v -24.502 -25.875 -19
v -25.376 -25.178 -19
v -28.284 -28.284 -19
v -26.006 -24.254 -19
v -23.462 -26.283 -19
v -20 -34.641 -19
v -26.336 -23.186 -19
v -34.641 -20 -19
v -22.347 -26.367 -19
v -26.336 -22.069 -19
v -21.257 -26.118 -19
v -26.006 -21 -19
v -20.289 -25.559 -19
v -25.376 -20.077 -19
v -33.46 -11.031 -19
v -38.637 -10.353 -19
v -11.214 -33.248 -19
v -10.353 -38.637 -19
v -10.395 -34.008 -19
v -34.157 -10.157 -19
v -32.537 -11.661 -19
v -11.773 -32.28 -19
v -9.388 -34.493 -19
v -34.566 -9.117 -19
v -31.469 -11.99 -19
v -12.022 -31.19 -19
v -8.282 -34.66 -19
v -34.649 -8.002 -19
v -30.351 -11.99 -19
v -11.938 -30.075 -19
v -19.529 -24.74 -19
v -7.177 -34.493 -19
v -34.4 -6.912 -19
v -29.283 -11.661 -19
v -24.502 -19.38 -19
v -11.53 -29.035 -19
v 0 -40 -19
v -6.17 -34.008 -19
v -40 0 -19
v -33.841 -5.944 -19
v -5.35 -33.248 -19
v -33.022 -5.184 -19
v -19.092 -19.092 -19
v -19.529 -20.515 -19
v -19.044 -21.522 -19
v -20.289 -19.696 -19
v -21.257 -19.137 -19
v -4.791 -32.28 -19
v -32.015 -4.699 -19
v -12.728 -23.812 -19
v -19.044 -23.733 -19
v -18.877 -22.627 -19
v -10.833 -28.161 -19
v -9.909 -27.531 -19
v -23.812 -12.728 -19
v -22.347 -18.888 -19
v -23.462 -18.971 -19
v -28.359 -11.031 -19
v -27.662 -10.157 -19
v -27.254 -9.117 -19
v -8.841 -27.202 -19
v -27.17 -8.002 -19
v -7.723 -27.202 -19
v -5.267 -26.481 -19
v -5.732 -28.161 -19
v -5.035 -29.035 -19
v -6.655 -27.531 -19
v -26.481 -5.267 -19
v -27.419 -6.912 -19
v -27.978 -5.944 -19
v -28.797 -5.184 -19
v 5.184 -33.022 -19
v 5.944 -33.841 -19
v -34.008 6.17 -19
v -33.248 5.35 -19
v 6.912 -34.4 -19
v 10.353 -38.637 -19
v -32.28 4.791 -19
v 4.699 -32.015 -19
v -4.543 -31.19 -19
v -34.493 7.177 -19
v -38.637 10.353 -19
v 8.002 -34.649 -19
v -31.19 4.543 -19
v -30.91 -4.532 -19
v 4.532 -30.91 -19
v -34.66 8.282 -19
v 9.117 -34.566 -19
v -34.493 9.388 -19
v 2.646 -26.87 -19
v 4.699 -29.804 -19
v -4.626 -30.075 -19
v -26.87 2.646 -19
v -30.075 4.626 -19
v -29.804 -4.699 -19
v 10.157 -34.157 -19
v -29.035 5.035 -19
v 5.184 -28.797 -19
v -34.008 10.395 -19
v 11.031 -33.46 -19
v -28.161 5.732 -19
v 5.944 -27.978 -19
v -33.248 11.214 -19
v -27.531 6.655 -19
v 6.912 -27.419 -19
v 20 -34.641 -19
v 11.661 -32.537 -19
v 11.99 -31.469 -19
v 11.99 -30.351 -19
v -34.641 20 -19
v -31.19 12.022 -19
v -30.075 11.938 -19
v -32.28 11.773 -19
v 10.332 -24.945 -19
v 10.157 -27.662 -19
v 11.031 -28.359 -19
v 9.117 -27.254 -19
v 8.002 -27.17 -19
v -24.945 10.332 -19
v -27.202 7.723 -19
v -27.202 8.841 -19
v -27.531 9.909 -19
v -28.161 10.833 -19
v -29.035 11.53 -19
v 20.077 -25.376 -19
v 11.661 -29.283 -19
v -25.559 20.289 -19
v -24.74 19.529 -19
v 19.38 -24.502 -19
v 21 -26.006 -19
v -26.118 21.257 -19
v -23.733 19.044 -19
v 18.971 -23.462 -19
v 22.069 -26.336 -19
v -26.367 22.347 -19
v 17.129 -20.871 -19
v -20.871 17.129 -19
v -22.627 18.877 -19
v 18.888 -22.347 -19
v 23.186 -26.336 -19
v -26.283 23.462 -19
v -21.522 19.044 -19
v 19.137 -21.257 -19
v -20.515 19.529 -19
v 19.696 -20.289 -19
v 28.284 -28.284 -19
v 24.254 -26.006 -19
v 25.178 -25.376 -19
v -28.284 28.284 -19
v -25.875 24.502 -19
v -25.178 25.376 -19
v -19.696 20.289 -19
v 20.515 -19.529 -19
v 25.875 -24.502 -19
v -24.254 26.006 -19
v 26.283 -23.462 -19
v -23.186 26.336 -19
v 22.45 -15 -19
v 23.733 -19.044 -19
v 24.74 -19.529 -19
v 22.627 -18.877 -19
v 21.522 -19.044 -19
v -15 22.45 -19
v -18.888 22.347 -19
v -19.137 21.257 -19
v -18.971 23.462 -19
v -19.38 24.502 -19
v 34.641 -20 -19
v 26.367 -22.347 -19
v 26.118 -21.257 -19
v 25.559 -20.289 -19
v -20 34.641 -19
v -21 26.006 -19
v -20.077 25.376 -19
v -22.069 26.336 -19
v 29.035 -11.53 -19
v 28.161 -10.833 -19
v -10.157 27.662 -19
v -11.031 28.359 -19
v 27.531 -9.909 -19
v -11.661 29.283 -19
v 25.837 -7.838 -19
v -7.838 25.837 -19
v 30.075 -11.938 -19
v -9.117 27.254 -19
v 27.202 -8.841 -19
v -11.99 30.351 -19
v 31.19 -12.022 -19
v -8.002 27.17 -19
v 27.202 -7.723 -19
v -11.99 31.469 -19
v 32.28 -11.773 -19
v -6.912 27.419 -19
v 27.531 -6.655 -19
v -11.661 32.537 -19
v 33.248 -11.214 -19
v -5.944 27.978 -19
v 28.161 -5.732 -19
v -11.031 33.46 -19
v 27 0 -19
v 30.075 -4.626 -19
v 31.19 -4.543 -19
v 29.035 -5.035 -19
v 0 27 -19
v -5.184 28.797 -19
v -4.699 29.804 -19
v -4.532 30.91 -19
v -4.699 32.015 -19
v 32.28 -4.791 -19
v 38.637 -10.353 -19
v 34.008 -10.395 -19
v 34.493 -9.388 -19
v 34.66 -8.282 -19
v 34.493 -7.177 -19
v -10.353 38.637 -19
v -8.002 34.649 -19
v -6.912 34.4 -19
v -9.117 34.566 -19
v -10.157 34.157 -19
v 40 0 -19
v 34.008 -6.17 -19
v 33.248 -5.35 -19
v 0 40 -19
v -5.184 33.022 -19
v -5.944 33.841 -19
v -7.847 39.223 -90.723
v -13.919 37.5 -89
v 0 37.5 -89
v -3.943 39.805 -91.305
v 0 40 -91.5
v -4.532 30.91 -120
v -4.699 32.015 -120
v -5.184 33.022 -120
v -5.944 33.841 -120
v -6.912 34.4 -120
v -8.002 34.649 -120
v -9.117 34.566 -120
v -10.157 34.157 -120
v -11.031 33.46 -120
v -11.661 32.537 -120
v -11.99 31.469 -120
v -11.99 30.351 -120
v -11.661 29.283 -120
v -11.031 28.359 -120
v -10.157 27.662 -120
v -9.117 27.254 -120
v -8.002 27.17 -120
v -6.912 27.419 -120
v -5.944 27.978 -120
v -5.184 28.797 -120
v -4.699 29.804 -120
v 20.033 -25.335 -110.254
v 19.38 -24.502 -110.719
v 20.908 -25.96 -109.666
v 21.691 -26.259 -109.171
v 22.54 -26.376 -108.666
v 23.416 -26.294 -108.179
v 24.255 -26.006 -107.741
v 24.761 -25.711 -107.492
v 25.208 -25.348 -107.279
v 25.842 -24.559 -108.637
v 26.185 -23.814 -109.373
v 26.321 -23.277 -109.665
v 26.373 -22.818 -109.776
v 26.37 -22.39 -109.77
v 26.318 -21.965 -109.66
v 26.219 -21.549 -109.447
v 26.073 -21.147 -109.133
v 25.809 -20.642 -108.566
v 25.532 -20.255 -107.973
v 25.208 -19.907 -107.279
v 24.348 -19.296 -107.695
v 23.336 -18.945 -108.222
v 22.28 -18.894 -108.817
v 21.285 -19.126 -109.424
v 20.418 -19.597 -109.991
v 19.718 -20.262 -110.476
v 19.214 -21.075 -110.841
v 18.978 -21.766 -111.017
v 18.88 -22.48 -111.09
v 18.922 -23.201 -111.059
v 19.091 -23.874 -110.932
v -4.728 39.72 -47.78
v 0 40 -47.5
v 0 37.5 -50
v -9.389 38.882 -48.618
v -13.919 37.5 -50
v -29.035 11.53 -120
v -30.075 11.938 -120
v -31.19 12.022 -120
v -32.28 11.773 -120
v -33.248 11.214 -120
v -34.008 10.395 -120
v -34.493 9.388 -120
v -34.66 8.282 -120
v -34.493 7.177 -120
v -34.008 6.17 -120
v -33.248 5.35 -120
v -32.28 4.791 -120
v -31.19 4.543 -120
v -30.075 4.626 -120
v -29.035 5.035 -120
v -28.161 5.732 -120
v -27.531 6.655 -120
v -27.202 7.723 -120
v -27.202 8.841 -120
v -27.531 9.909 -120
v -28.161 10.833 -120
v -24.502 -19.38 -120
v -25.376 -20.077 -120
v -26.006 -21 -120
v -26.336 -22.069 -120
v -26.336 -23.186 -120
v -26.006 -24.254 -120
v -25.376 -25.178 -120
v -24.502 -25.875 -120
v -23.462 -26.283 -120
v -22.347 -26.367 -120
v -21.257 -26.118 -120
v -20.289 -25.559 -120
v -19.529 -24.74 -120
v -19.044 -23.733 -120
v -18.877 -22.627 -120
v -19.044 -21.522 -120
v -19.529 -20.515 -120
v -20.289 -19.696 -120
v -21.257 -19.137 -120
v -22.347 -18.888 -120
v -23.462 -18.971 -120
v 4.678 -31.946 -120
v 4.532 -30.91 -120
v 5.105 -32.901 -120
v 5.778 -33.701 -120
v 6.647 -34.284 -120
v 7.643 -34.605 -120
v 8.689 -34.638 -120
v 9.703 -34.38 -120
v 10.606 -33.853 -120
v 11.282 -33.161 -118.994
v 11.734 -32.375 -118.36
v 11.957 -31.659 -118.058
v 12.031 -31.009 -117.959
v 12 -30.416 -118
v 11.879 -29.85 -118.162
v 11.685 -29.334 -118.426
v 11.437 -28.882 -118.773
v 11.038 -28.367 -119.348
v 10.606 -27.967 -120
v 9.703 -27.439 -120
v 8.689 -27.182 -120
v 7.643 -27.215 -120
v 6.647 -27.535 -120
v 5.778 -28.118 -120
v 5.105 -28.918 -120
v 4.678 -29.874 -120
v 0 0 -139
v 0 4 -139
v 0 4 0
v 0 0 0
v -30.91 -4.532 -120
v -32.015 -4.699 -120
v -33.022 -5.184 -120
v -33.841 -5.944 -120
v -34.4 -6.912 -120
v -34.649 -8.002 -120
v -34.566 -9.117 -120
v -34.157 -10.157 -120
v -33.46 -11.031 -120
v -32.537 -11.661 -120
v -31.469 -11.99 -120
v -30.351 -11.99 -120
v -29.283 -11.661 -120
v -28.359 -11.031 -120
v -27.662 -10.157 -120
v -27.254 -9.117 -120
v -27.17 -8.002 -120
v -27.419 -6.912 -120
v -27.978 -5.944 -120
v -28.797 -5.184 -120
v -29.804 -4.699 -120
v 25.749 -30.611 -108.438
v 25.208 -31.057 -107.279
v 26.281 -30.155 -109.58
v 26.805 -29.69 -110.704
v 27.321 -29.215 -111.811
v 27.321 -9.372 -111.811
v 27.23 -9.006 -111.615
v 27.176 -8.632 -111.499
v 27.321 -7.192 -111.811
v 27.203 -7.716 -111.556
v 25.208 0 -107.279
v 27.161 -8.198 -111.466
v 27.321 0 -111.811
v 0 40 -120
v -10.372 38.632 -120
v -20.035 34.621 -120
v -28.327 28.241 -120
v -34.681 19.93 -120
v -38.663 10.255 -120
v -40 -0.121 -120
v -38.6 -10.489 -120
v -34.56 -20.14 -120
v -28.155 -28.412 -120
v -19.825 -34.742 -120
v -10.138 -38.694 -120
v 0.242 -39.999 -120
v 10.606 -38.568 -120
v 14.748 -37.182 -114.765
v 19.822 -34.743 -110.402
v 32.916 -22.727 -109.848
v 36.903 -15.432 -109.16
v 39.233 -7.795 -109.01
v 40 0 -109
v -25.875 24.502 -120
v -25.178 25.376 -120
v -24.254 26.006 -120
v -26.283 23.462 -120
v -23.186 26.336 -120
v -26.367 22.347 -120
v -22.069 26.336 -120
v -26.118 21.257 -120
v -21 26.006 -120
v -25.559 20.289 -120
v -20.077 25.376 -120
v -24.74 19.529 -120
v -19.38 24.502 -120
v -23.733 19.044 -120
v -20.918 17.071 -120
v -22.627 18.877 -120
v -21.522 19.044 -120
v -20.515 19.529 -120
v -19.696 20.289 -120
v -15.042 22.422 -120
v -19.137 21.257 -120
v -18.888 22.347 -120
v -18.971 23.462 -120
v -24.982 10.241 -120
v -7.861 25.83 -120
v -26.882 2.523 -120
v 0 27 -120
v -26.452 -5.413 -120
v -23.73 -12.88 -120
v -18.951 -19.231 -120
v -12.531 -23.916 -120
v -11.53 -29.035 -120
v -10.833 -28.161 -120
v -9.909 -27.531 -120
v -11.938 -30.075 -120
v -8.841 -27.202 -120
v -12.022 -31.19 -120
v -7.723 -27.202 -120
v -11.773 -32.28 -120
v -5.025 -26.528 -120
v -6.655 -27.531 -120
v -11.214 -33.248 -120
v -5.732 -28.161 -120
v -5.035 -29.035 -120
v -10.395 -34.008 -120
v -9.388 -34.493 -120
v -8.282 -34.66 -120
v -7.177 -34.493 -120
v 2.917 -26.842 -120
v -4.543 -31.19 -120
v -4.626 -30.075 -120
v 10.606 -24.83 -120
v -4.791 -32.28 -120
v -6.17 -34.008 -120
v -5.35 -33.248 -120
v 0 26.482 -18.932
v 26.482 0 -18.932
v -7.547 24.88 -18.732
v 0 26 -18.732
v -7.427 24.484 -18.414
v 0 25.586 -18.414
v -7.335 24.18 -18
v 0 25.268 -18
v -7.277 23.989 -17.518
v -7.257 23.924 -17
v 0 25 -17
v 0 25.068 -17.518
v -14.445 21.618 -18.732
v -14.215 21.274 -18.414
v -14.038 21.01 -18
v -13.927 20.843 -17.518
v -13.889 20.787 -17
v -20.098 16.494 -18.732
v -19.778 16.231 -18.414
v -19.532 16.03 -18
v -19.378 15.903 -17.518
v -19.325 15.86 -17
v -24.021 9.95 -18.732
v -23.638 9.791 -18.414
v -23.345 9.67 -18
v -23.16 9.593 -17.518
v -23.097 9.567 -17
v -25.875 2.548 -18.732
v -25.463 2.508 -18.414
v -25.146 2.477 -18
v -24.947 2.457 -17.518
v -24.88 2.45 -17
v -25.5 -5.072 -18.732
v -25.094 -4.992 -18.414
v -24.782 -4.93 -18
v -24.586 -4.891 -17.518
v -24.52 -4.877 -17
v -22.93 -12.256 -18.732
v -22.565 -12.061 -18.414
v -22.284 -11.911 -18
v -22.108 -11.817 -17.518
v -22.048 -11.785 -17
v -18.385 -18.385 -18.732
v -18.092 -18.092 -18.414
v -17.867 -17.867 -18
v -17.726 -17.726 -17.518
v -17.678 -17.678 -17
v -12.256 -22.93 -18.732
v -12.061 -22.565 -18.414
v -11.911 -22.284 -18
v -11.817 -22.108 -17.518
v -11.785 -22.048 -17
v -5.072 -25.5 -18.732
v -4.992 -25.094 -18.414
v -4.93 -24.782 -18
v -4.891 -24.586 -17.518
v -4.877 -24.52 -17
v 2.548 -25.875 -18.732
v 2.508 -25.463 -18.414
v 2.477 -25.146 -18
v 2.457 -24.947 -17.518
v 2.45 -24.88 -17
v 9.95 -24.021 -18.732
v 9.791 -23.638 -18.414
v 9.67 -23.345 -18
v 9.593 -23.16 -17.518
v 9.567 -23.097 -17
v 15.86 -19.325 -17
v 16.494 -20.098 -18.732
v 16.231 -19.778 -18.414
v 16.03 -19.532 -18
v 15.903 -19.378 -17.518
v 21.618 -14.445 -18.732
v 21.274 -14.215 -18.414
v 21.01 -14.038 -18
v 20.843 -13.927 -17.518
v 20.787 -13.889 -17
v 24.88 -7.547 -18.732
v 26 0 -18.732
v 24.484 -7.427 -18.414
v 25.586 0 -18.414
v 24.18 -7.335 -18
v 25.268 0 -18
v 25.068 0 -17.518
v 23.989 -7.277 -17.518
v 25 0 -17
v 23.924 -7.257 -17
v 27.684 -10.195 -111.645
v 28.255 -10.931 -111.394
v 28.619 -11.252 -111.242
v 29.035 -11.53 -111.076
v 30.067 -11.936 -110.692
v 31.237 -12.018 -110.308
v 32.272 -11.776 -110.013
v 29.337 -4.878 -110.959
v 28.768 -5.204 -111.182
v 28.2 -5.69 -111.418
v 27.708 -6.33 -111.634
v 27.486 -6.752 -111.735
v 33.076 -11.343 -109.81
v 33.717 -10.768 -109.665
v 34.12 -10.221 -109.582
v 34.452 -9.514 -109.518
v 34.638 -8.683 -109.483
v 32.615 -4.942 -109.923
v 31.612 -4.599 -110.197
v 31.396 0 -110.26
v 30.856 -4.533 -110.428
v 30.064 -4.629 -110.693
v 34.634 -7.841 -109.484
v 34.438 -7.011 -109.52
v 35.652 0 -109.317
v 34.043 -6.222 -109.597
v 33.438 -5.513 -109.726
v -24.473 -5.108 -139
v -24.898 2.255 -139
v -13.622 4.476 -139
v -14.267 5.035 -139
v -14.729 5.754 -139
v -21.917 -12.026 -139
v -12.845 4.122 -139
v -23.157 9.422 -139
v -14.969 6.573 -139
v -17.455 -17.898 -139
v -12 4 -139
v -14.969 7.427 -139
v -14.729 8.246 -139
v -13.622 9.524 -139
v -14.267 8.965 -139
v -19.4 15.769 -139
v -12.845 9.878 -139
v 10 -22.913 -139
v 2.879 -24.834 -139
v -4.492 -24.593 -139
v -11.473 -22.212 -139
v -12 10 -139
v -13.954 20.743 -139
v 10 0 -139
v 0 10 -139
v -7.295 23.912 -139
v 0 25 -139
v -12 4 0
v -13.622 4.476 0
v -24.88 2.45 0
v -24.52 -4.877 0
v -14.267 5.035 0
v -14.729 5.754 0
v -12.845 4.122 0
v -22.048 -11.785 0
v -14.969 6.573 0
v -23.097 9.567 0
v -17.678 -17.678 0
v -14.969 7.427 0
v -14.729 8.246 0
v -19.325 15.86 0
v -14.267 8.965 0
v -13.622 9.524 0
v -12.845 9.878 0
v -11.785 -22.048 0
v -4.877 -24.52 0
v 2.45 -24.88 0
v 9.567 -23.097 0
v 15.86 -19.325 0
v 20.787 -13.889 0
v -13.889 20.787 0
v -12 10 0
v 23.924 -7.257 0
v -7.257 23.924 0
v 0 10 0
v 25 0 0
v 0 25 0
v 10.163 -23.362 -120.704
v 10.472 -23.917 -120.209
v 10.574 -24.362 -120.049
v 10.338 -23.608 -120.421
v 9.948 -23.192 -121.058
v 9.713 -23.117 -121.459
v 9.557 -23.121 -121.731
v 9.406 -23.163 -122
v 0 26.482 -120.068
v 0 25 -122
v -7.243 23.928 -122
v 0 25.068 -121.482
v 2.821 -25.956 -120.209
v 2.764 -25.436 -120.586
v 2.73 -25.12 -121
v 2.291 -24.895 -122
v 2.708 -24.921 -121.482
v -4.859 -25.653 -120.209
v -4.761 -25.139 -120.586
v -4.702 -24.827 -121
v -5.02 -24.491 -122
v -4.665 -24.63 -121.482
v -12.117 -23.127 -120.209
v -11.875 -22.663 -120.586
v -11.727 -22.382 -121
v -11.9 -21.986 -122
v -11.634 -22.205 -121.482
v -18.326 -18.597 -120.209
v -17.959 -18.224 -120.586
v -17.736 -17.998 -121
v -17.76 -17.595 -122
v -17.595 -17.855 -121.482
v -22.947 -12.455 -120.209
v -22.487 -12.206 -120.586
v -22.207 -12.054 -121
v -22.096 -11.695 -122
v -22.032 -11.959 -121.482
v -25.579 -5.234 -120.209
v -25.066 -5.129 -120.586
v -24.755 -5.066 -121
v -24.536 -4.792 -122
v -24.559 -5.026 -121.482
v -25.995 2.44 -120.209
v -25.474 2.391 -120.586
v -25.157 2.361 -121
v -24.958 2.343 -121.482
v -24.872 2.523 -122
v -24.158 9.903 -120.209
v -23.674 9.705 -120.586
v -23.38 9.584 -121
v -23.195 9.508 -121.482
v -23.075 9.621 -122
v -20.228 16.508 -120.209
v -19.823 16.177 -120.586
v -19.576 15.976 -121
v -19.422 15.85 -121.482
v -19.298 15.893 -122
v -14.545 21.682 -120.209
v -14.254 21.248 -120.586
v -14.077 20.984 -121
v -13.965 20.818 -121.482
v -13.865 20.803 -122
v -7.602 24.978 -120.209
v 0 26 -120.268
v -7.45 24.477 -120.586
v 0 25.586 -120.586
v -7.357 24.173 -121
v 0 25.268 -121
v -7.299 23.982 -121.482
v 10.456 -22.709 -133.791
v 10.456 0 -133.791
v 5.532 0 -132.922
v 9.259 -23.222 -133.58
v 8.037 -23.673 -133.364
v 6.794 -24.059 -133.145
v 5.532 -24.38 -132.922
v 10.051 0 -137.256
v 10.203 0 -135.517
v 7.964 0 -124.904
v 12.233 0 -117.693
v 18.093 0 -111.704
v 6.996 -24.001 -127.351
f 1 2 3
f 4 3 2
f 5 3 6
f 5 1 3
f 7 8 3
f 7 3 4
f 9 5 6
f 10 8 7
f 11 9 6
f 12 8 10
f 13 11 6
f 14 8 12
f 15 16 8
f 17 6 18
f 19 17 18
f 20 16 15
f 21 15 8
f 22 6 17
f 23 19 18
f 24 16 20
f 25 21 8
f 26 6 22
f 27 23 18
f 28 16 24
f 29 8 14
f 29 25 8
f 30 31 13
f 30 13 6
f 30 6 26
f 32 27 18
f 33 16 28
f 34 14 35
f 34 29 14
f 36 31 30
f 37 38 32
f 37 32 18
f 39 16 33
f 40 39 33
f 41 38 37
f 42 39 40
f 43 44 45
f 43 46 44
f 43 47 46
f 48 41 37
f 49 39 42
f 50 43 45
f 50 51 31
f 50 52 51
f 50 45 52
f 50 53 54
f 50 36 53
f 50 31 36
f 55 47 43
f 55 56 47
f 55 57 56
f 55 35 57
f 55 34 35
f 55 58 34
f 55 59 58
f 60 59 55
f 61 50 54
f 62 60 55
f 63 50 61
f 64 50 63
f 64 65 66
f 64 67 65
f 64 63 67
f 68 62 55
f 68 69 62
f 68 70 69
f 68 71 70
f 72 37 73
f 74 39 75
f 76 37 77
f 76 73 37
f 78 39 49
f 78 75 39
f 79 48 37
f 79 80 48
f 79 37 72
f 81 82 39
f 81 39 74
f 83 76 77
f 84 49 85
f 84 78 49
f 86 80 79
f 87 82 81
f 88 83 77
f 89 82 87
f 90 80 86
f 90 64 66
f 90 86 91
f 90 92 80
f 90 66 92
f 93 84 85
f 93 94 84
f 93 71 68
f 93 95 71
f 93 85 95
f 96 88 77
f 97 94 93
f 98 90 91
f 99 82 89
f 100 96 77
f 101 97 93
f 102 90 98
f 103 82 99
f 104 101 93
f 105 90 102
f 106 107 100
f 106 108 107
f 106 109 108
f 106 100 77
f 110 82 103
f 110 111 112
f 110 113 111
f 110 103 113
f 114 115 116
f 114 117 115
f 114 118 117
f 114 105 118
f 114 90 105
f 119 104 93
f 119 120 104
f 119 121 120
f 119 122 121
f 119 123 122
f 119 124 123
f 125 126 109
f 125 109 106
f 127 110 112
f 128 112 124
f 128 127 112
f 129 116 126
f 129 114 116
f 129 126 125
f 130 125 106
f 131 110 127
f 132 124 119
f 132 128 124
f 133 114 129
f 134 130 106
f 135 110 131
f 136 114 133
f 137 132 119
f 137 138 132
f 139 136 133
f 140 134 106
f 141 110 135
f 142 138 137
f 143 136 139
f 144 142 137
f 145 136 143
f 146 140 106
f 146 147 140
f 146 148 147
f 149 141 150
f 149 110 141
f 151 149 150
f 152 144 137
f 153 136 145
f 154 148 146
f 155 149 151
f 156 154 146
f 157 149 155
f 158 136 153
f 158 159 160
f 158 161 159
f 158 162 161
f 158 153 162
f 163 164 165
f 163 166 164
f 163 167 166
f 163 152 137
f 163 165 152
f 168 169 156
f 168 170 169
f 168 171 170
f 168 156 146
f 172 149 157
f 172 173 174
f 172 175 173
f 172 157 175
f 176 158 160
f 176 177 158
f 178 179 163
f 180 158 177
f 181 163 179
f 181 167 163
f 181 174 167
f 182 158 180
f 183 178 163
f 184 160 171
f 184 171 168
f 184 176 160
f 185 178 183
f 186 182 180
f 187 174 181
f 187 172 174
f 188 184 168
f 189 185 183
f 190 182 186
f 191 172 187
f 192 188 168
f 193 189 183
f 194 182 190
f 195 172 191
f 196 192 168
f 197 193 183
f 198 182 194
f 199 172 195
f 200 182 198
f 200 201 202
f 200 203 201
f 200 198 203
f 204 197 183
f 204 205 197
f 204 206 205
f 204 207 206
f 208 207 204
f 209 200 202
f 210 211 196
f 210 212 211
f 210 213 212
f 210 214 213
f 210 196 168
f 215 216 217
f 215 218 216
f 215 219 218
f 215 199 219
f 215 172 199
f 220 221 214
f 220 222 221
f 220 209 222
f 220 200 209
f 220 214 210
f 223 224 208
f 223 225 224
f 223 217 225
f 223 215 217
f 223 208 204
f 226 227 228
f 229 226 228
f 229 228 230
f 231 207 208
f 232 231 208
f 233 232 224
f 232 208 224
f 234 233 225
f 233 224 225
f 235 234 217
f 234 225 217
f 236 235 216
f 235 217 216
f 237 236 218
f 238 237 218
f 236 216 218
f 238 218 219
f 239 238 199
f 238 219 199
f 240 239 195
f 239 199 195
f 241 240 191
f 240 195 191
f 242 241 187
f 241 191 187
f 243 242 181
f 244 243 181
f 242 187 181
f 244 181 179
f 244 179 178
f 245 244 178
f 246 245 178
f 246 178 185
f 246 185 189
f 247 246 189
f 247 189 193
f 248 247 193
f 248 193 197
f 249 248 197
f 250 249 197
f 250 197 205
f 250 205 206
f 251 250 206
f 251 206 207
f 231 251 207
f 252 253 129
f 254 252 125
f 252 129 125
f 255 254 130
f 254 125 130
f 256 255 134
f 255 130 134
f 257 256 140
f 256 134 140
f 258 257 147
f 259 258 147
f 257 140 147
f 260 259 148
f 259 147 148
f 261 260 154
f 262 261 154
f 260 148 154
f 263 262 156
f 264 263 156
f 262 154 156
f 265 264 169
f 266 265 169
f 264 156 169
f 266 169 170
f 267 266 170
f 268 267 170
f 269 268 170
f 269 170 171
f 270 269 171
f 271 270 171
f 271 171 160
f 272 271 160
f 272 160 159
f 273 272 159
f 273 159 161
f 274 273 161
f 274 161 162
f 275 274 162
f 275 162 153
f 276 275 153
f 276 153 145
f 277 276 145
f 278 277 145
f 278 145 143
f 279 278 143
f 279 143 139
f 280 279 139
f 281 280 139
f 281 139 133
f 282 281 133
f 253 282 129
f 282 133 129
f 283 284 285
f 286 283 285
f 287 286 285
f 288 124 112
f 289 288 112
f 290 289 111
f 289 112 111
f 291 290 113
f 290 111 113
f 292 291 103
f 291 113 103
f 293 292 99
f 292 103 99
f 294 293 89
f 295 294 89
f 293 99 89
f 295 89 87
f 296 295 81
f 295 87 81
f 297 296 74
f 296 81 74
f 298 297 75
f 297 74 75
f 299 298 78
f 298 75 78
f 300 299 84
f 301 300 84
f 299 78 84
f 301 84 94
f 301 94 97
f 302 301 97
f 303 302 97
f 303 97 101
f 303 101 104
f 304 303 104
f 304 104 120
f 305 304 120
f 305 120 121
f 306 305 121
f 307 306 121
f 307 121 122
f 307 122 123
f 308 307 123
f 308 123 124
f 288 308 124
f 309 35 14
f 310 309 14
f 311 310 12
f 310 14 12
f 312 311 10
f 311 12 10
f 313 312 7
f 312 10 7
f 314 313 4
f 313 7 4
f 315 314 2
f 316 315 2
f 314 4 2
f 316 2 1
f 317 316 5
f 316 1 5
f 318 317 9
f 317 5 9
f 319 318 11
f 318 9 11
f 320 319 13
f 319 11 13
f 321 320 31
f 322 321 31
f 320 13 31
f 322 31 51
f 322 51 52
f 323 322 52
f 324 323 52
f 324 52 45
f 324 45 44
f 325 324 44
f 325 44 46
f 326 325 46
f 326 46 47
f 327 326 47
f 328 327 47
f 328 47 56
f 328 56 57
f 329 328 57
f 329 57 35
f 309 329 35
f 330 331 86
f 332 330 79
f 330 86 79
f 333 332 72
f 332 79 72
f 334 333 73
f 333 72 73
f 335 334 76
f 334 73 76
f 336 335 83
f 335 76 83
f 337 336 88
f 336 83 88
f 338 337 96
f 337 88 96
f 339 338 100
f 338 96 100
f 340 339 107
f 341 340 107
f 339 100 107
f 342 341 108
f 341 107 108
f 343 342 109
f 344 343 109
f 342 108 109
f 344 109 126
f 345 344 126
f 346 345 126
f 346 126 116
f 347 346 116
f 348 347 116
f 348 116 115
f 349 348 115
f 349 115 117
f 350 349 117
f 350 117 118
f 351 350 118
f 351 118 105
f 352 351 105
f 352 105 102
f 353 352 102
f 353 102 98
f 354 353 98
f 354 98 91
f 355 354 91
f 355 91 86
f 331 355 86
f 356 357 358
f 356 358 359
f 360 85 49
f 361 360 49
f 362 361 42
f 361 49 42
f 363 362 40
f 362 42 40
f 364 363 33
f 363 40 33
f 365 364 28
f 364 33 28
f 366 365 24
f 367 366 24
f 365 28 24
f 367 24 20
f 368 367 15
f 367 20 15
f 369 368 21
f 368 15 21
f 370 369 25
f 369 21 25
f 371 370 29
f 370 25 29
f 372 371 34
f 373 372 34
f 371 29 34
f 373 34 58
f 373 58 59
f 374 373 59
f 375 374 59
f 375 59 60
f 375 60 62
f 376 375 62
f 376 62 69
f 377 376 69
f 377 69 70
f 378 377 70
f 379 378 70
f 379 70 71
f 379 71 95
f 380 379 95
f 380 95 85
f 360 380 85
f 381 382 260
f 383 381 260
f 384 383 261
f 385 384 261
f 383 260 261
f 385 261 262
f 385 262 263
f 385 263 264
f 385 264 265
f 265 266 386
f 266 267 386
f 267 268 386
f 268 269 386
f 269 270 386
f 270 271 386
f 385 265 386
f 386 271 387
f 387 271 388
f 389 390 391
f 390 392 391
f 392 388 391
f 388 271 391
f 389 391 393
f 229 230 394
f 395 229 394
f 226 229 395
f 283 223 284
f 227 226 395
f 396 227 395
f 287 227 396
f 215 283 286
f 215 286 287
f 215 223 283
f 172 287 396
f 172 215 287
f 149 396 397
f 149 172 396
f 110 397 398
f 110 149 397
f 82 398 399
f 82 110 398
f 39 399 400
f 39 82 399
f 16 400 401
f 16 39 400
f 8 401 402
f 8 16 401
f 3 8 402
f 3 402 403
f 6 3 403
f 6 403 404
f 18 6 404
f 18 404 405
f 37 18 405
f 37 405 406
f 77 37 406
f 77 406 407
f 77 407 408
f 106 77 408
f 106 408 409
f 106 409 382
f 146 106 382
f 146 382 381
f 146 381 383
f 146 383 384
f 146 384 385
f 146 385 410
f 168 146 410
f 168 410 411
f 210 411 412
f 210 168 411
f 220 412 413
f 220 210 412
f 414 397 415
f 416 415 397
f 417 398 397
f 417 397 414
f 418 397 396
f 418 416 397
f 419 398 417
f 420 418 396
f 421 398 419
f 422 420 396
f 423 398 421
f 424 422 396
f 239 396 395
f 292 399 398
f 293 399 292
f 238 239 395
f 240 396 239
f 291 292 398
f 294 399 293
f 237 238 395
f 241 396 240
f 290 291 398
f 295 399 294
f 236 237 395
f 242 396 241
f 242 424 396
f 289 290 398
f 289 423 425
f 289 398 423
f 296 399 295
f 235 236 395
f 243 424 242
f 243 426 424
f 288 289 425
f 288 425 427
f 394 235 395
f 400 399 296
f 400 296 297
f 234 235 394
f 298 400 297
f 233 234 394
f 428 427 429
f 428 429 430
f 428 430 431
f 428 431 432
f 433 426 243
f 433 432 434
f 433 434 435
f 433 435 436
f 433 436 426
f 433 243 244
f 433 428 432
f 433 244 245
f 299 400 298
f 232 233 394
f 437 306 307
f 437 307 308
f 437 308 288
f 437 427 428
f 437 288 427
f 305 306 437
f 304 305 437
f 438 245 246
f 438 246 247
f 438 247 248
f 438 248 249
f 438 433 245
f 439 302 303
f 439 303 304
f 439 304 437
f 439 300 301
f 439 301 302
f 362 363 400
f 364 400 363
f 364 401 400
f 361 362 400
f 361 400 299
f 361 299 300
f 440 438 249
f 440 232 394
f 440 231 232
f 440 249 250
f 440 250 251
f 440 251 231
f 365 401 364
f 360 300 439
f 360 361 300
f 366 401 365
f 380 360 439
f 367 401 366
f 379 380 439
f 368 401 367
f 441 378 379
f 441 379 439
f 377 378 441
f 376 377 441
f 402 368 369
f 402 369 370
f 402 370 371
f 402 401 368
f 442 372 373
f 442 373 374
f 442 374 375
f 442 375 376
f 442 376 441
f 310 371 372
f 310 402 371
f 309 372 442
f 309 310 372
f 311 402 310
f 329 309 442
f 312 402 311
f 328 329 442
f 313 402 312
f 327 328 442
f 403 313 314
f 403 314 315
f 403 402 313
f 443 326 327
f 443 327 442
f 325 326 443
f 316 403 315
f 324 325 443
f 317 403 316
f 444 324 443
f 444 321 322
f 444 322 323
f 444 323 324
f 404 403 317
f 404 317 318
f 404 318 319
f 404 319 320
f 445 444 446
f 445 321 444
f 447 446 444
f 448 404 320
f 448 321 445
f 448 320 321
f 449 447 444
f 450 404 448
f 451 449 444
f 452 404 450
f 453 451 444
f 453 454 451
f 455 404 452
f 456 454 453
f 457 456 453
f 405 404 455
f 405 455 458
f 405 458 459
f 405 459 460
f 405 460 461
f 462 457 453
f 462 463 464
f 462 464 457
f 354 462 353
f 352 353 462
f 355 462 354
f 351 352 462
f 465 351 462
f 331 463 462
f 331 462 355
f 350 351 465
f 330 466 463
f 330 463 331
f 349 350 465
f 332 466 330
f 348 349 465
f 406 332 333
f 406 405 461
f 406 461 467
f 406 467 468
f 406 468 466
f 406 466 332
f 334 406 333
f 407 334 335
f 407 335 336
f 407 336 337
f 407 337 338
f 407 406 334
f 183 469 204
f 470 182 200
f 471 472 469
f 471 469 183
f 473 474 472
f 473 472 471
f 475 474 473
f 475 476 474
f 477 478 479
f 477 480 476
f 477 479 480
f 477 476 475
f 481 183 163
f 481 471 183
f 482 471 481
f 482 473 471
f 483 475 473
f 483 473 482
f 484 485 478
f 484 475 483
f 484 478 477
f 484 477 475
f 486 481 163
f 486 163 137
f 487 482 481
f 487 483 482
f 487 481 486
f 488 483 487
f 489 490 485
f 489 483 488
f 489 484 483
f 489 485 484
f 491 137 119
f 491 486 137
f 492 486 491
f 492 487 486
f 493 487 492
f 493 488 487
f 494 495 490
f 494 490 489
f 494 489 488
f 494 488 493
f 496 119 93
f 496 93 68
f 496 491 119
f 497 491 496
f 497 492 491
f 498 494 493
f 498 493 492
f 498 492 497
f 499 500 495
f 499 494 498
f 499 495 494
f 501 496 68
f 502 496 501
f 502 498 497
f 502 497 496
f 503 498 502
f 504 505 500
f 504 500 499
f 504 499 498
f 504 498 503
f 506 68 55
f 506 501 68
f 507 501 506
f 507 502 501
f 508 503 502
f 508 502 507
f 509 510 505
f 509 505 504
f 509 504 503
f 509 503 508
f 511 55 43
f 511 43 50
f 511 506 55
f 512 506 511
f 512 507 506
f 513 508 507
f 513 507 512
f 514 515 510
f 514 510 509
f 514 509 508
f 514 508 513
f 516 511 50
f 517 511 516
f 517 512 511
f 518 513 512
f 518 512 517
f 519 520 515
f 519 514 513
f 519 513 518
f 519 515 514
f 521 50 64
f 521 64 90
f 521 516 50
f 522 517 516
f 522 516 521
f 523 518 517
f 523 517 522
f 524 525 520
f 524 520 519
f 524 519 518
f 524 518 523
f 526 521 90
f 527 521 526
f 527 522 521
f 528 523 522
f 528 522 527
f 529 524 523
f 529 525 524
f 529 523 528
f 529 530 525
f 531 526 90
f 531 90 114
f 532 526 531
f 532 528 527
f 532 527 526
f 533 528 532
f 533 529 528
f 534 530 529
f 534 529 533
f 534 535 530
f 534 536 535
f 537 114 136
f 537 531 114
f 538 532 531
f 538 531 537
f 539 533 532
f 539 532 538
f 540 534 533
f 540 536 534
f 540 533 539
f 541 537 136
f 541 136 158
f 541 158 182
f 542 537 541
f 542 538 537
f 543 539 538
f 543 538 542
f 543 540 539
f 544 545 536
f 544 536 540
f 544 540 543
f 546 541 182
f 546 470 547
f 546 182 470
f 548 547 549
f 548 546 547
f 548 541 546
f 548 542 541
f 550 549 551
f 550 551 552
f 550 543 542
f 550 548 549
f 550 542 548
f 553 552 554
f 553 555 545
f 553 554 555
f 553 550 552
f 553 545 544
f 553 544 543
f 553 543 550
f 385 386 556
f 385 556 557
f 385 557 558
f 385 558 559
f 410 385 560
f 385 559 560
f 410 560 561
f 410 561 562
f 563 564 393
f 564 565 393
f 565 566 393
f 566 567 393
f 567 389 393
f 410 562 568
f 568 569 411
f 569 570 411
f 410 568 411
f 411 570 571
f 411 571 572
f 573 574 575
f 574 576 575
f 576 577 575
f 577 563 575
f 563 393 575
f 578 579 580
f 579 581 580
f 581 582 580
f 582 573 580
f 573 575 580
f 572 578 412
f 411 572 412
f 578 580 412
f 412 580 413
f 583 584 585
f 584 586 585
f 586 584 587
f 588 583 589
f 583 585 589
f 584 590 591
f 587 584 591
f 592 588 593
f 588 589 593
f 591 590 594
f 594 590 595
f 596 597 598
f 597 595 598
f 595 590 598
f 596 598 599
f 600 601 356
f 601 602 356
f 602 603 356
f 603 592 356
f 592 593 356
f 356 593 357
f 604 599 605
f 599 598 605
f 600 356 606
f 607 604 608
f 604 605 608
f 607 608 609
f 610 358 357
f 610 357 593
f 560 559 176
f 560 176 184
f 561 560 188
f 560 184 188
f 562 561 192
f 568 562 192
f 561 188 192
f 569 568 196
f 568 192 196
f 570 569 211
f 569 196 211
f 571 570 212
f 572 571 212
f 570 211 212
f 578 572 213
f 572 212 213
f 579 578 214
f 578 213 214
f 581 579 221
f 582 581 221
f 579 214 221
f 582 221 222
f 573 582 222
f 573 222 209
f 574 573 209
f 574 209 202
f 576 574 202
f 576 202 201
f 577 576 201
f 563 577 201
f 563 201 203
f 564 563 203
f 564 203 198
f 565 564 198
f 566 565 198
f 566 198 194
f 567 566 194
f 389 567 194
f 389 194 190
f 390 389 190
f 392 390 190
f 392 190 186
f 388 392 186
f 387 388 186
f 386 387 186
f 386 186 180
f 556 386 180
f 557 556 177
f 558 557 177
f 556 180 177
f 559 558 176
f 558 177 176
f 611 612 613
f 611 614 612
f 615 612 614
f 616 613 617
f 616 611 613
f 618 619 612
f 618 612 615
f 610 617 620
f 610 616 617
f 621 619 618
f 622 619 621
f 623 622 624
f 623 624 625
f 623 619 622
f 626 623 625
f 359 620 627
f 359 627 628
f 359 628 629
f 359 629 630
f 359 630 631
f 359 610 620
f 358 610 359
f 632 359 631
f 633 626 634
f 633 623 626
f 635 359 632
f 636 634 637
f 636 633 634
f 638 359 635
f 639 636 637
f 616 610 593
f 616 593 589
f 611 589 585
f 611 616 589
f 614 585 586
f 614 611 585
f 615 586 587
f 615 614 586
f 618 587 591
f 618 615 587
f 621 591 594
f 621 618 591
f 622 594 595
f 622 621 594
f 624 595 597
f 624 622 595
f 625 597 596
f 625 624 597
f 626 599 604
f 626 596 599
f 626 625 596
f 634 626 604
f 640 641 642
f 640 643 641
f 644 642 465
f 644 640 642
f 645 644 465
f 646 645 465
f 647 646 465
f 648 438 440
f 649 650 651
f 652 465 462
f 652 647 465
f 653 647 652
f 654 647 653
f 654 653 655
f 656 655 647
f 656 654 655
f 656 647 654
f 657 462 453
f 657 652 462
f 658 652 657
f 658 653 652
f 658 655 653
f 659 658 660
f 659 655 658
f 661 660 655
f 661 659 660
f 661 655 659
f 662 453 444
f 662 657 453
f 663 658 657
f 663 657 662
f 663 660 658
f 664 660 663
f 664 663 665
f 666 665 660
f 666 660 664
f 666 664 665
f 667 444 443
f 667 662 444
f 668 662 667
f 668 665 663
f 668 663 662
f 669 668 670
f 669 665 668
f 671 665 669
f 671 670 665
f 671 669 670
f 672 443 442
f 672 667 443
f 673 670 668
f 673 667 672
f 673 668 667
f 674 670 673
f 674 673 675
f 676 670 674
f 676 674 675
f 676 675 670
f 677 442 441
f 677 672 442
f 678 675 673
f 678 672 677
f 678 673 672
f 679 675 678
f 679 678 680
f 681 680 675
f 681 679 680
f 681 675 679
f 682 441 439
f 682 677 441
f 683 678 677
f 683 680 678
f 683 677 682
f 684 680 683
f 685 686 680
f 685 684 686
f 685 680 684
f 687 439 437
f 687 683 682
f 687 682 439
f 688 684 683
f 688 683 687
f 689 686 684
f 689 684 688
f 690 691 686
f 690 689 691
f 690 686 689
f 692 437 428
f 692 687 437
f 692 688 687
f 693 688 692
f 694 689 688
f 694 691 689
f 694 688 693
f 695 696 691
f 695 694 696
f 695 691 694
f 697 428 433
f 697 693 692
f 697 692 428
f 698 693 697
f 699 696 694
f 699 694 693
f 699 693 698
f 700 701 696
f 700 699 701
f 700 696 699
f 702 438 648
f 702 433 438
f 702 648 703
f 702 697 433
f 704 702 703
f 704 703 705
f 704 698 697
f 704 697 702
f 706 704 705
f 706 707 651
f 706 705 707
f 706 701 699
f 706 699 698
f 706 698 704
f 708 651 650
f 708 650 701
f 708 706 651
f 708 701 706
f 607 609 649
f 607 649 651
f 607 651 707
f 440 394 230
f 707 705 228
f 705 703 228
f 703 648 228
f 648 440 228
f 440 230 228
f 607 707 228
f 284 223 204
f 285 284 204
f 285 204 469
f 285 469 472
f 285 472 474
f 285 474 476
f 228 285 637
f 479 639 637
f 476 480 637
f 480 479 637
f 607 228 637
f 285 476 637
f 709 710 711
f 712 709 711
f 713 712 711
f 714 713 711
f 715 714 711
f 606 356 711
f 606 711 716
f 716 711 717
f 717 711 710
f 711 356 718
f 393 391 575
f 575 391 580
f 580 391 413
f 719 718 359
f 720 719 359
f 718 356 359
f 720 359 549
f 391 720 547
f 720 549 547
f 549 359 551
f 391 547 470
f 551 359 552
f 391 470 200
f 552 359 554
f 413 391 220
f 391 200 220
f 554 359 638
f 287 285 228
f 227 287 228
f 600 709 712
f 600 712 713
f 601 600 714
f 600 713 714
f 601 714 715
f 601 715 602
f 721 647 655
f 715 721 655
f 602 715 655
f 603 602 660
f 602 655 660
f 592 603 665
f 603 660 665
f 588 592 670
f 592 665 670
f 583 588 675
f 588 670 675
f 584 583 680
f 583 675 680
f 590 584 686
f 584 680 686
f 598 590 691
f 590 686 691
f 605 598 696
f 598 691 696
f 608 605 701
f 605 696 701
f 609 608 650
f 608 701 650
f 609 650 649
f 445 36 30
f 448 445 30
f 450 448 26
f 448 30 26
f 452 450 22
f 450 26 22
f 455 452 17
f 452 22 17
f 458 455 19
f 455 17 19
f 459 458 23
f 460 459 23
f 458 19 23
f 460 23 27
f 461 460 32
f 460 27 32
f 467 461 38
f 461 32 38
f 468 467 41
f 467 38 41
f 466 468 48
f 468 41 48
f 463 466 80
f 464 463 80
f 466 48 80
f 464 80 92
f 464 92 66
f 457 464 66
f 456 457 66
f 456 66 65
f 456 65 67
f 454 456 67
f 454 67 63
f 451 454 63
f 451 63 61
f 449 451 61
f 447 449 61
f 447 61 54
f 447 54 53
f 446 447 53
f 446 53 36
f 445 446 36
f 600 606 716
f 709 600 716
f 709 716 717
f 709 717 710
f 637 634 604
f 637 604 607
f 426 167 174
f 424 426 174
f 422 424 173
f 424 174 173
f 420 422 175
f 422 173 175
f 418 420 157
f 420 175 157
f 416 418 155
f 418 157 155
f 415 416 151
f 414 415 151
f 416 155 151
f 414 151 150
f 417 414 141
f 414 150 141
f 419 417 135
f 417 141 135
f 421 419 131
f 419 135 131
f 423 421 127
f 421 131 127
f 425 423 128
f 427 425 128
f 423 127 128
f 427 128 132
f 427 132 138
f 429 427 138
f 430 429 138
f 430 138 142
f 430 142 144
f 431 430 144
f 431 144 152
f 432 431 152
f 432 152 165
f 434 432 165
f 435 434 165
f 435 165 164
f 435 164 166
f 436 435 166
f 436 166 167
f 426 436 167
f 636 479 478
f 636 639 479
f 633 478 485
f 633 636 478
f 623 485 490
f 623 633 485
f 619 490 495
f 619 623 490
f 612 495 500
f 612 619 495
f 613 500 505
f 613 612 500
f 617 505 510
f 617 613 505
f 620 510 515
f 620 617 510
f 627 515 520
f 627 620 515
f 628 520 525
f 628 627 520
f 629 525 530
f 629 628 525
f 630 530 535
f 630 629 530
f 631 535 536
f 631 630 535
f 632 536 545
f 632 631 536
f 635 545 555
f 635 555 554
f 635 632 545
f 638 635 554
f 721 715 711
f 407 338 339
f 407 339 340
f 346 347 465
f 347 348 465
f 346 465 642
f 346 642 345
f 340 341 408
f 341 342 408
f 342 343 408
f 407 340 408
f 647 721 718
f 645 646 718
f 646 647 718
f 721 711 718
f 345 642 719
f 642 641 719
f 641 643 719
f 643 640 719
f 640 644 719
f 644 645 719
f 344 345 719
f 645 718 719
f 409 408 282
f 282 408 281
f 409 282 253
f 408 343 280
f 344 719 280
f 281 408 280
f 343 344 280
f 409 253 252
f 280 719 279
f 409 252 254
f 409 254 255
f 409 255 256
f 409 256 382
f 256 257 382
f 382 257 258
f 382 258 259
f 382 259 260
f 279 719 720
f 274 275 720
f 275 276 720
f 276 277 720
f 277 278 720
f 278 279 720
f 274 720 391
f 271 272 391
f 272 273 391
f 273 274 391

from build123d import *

# Parameters (mm, degrees)
SKETCH1_R           = 40
BOSS_EXTRUDE1_DEPTH = 139
SKETCH2_R           = 40
SKETCH2_R_2         = 25
CUT_EXTRUDE1_DEPTH  = 19
CUT_EXTRUDE2_START  = -19
SKETCH3_R           = 40
SKETCH3_R_2         = 25
CUT_EXTRUDE2_DEPTH  = 19
FILLET1_R           = 2
CUT_EXTRUDE7_DEPTH  = 151.069983674
CUT_EXTRUDE8_DEPTH  = 151.069983674
CUT_EXTRUDE9_DEPTH  = 151.069983674
SKETCH8_R           = 3.75
CUT_EXTRUDE10_DEPTH = 151.069983674
CIRPATTERN1_COUNT   = 12
CUT_EXTRUDE14_DEPTH = 151.069983674


with BuildPart() as part:
    # Sketch1 → Boss-Extrude1 (new body)
    with BuildSketch(Plane.XY):
        Circle(SKETCH1_R)
    extrude(amount=-BOSS_EXTRUDE1_DEPTH)

    # Sketch2 → Cut-Extrude1 (cut)
    with BuildSketch(Plane.XY):
        Circle(SKETCH2_R)
        Circle(SKETCH2_R_2, mode=Mode.SUBTRACT)
    extrude(amount=-CUT_EXTRUDE1_DEPTH, mode=Mode.SUBTRACT)

    # Sketch3 → Cut-Extrude2 (cut)
    with BuildSketch(Plane(origin=(0, 0, -139), x_dir=(-1, 0, 0), z_dir=(0, 0, -1)).offset(CUT_EXTRUDE2_START)):
        with Locations(Location((0, 0, 0), (0, 0, 180))):
            Circle(SKETCH3_R)
        with Locations(Location((0, 0, 0), (0, 0, 180))):
            Circle(SKETCH3_R_2, mode=Mode.SUBTRACT)
    extrude(amount=CUT_EXTRUDE2_DEPTH, mode=Mode.SUBTRACT)

    # Fillet1
    fillet1_edges = [part.edges().sort_by_distance(p)[0] for p in [
        (-25, 0, -120),
        (-25, 0, -19),
    ]]
    fillet(fillet1_edges, radius=FILLET1_R)

    # Sketch5 → Cut-Extrude7 (cut, through all)
    with BuildSketch(Plane.XY):
        Polygon((0, 40), (0, 0), (40, 0), align=None)
    extrude(amount=-CUT_EXTRUDE7_DEPTH, mode=Mode.SUBTRACT)


with BuildPart() as body_2:
    # of the pieces the cut leaves, the one that is kept (cut_extrude7_keep)
    add(part.part.solids().sort_by_distance((27, 0, -120))[0])

    # Sketch6 → Cut-Extrude8 (cut, through all)
    with BuildSketch(Plane.XY):
        with BuildLine():
            Line((12, 4), (-12, 4))
            ThreePointArc((-12, 4), (-15, 7), (-12, 10))
            Line((-12, 10), (12, 10))
            ThreePointArc((12, 10), (15, 7), (12, 4))
        make_face()
    extrude(amount=-CUT_EXTRUDE8_DEPTH, mode=Mode.SUBTRACT)

    # Sketch7 → Cut-Extrude9 (cut, through all)
    with BuildSketch(Plane(origin=(0, 0, 0), x_dir=(0, 0, -1), z_dir=(1, 0, 0))):
        Polygon((91.5, 40), (47.5, 40), (50, 37.5), (89, 37.5), align=None)
    extrude(amount=-CUT_EXTRUDE9_DEPTH, mode=Mode.SUBTRACT)

    # Sketch8 → Cut-Extrude10 (cut, through all)
    with BuildSketch(Plane.XY):
        with Locations((-8.282209443, 30.909626441)):
            Circle(SKETCH8_R)
    cut_extrude10 = extrude(amount=-CUT_EXTRUDE10_DEPTH, mode=Mode.SUBTRACT)

    # CirPattern1: Cut-Extrude10 ×12 about axis
    cirpattern1_axis = Axis((0, 0, -19), (0, 0, 1))
    for i in range(1, CIRPATTERN1_COUNT):
        add(cut_extrude10.rotate(cirpattern1_axis, i * 360 / CIRPATTERN1_COUNT), mode=Mode.SUBTRACT)

    # Sketch9 → Cut-Extrude14 (cut, through all)
    with BuildSketch(Plane(origin=(0, 0, 0), x_dir=(1, 0, 0), z_dir=(0, 1, 0))):
        with BuildLine():
            Line((40, 139), (10, 139))
            ThreePointArc((10, 139), (10.114159057, 136.385327718), (10.45576741, 133.79055467))
            Line((10.45576741, 133.79055467), (40, 139))
        make_face()
        with BuildLine():
            Line((40, 109), (40, 139))
            Line((40, 139), (27.321452148, 111.810766389))
            ThreePointArc((27.321452148, 111.810766389), (33.506811582, 109.711119786), (40, 109))
        make_face()
        with BuildLine():
            Line((27.321452148, 111.810766389), (40, 139))
            Line((40, 139), (10.45576741, 133.79055467))
            ThreePointArc((10.45576741, 133.79055467), (16.199399791, 120.73715713), (27.321452148, 111.810766389))
        make_face()
        with BuildLine():
            ThreePointArc((27.321452148, 111.810766389), (16.199399791, 120.73715713), (10.45576741, 133.79055467))
            Line((10.45576741, 133.79055467), (5.531728645, 132.922313782))
            ThreePointArc((5.531728645, 132.922313782), (12.23263309, 117.693349985), (25.208360839, 107.279227454))
            Line((25.208360839, 107.279227454), (27.321452148, 111.810766389))
        make_face()
    extrude(amount=-CUT_EXTRUDE14_DEPTH, mode=Mode.SUBTRACT)


solid = body_2.part
